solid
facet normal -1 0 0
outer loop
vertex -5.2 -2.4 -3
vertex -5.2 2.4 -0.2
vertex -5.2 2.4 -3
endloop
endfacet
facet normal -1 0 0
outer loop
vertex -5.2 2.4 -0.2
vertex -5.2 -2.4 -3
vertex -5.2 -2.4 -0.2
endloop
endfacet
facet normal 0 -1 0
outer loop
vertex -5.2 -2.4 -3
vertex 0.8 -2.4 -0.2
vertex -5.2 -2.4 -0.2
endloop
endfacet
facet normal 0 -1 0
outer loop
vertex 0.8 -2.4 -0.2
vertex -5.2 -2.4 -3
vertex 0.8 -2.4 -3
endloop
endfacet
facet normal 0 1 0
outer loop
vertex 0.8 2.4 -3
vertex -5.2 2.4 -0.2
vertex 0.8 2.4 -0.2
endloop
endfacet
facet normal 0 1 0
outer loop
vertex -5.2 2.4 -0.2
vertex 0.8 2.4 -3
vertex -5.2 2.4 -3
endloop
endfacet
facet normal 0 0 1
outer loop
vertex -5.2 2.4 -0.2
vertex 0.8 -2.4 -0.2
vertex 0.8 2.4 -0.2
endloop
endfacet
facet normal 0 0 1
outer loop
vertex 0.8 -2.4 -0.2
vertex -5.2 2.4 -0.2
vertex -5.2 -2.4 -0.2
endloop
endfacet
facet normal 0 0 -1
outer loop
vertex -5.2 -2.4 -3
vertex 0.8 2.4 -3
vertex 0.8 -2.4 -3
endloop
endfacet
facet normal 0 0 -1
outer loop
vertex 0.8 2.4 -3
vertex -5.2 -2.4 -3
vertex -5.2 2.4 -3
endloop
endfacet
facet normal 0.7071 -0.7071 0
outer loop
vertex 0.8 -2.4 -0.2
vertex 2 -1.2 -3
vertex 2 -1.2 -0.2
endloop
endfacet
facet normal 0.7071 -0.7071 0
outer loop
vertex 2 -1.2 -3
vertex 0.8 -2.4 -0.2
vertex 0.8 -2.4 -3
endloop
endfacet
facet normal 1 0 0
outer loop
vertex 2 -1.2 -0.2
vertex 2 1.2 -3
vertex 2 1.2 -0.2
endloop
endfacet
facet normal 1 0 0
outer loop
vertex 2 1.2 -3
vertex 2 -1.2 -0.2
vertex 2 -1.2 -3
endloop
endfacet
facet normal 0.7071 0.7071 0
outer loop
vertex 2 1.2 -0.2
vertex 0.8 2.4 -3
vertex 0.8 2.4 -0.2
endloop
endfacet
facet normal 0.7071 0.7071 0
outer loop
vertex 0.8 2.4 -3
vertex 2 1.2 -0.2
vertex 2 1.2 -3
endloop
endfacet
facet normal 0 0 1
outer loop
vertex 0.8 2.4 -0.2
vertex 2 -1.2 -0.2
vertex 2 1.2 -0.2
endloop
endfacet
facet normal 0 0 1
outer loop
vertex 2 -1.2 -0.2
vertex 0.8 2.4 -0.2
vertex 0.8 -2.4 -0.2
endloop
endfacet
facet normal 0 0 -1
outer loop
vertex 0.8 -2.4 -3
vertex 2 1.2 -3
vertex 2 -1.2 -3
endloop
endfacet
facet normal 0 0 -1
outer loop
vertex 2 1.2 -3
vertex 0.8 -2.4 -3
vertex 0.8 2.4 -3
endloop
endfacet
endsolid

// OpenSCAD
// file: ../p/rect3.scad
use <../lib.scad>
function ldraw_lib__rect3() = [
// 0 Rectangle with 3 Edges
// 0 Name: rect3.dat
// 0 Author: Mark Kennedy [mkennedy]
// 0 !LDRAW_ORG Primitive UPDATE 2010-01
// 0 !LICENSE Licensed under CC BY 4.0 : see CAreadme.txt
// 
// 0 BFC CERTIFY CCW
  [0,"BFC","CERTIFY"],
  [0,"BFC","CCW"],
// 
// 0 !HISTORY 2003-08-01 [PTadmin] Official Update 2003-02
// 0 !HISTORY 2007-06-24 [PTadmin] Header formatted for Contributor Agreement
// 0 !HISTORY 2008-07-01 [PTadmin] Official Update 2008-01
// 0 !HISTORY 2010-01-17 [mikeheide] Change winding to CCW
// 0 !HISTORY 2010-04-05 [PTadmin] Official Update 2010-01
// 
// 
// 2 24 1 0 1 -1 0 1
  [2,24,1,0,1,-1,0,1],
// 2 24 1 0 1 1 0 -1
  [2,24,1,0,1,1,0,-1],
// 2 24 -1 0 1 -1 0 -1
  [2,24,-1,0,1,-1,0,-1],
// 4 16 -1 0 1 -1 0 -1 1 0 -1 1 0 1
  [4,16,-1,0,1,-1,0,-1,1,0,-1,1,0,1],
// 0 //
];
module ldraw_lib__rect3(step=0, col=false, unit=2/5, alt=false, line=0.2, solid=!$preview)
    makepoly(ldraw_lib__rect3(), step=step, col=col, unit=unit, alt=alt, line=line, solid=solid);
ldraw_lib__rect3(line=0.2);
// file: ../p/rect2p.scad
use <../lib.scad>
function ldraw_lib__rect2p() = [
// 0 Rectangle with 2 Parallel Edges
// 0 Name: rect2p.dat
// 0 Author: Donald Sutter [technog]
// 0 !LDRAW_ORG Primitive UPDATE 2010-01
// 0 !LICENSE Licensed under CC BY 4.0 : see CAreadme.txt
// 
// 0 BFC CERTIFY CCW
  [0,"BFC","CERTIFY"],
  [0,"BFC","CCW"],
// 
// 0 !HISTORY 2003-08-01 [PTadmin] Official Update 2003-02
// 0 !HISTORY 2007-06-24 [PTadmin] Header formatted for Contributor Agreement
// 0 !HISTORY 2008-07-01 [PTadmin] Official Update 2008-01
// 0 !HISTORY 2010-01-17 [mikeheide] changed winding to CCW
// 0 !HISTORY 2010-04-05 [PTadmin] Official Update 2010-01
// 
// 
// 2 24 1 0 1 -1 0 1
  [2,24,1,0,1,-1,0,1],
// 2 24 -1 0 -1 1 0 -1
  [2,24,-1,0,-1,1,0,-1],
// 4 16 -1 0 1 -1 0 -1 1 0 -1 1 0 1
  [4,16,-1,0,1,-1,0,-1,1,0,-1,1,0,1],
// 0
];
module ldraw_lib__rect2p(step=0, col=false, unit=2/5, alt=false, line=0.2, solid=!$preview)
    makepoly(ldraw_lib__rect2p(), step=step, col=col, unit=unit, alt=alt, line=line, solid=solid);
ldraw_lib__rect2p(line=0.2);
// file: ../p/box5-2p.scad
use <../lib.scad>
function ldraw_lib__box5_2p() = [
// 0 Box with 5 Faces without 2 Parallel Edges
// 0 Name: box5-2p.dat
// 0 Author: Joerg Sommerer [Brickaneer]
// 0 !LDRAW_ORG Primitive UPDATE 2012-01
// 0 !LICENSE Licensed under CC BY 2.0 and CC BY 4.0 : see CAreadme.txt
// 
// 0 BFC CERTIFY CCW
  [0,"BFC","CERTIFY"],
  [0,"BFC","CCW"],
// 
// 0 !HISTORY 2012-03-30 [PTadmin] Official Update 2012-01
// 
// 
// 2 24 1 1 1 -1 1 1
  [2,24,1,1,1,-1,1,1],
// 2 24 -1 1 1 -1 1 -1
  [2,24,-1,1,1,-1,1,-1],
// 2 24 -1 1 -1 1 1 -1
  [2,24,-1,1,-1,1,1,-1],
// 2 24 1 1 -1 1 1 1
  [2,24,1,1,-1,1,1,1],
// 2 24 1 0 1 1 1 1
  [2,24,1,0,1,1,1,1],
// 2 24 -1 0 1 -1 1 1
  [2,24,-1,0,1,-1,1,1],
// 2 24 1 0 -1 1 1 -1
  [2,24,1,0,-1,1,1,-1],
// 2 24 -1 0 -1 -1 1 -1
  [2,24,-1,0,-1,-1,1,-1],
// 2 24 -1 0 1 -1 0 -1
  [2,24,-1,0,1,-1,0,-1],
// 2 24 1 0 -1 1 0 1
  [2,24,1,0,-1,1,0,1],
// 4 16 1 1 -1 -1 1 -1 -1 1 1 1 1 1
  [4,16,1,1,-1,-1,1,-1,-1,1,1,1,1,1],
// 4 16 -1 1 1 -1 0 1 1 0 1 1 1 1
  [4,16,-1,1,1,-1,0,1,1,0,1,1,1,1],
// 4 16 -1 1 -1 -1 0 -1 -1 0 1 -1 1 1
  [4,16,-1,1,-1,-1,0,-1,-1,0,1,-1,1,1],
// 4 16 1 1 -1 1 0 -1 -1 0 -1 -1 1 -1
  [4,16,1,1,-1,1,0,-1,-1,0,-1,-1,1,-1],
// 4 16 1 1 1 1 0 1 1 0 -1 1 1 -1
  [4,16,1,1,1,1,0,1,1,0,-1,1,1,-1],
];
module ldraw_lib__box5_2p(step=0, col=false, unit=2/5, alt=false, line=0.2, solid=!$preview)
    makepoly(ldraw_lib__box5_2p(), step=step, col=col, unit=unit, alt=alt, line=line, solid=solid);
ldraw_lib__box5_2p(line=0.2);
// main file
use <../lib.scad>
use <../p/box5-2p.scad>
use <../p/rect2p.scad>
use <../p/rect3.scad>
function ldraw_lib__t1054() = [
// 0 ~| Circuit Cubes Corner Shim
// 0 Name: t1054.dat
// 0 Author: Philippe Hurbain [Philo]
// 0 !LDRAW_ORG Part UPDATE 2022-05
// 0 !LICENSE Licensed under CC BY 4.0 : see CAreadme.txt
// 
// 0 BFC CERTIFY CCW
  [0,"BFC","CERTIFY"],
  [0,"BFC","CCW"],
// 
// 0 !CATEGORY Electric
// 
// 0 !HISTORY 2022-09-15 [PTadmin] Official Update 2022-05
// 
// 
// 1 16 2 4 0 0 -15 0 0 0 -3.5 6 0 0 box5-2p.dat
  [1,16,2,4,0,0,-15,0,0,0,-3.5,6,0,0, ldraw_lib__box5_2p()],
// 1 16 3.5 4 -4.5 0 -1 1.5 3.5 0 0 0 0 1.5 rect3.dat
  [1,16,3.5,4,-4.5,0,-1,1.5,3.5,0,0,0,0,1.5, ldraw_lib__rect3()],
// 1 16 5 4 0 0 -1 0 3.5 0 0 0 0 3 rect3.dat
  [1,16,5,4,0,0,-1,0,3.5,0,0,0,0,3, ldraw_lib__rect3()],
// 1 16 3.5 4 4.5 1.5 -1 0 0 0 3.5 -1.5 0 0 rect2p.dat
  [1,16,3.5,4,4.5,1.5,-1,0,0,0,3.5,-1.5,0,0, ldraw_lib__rect2p()],
// 4 16 2 0.5 6 2 0.5 -6 5 0.5 -3 5 0.5 3
  [4,16,2,0.5,6,2,0.5,-6,5,0.5,-3,5,0.5,3],
// 4 16 5 7.5 -3 2 7.5 -6 2 7.5 6 5 7.5 3
  [4,16,5,7.5,-3,2,7.5,-6,2,7.5,6,5,7.5,3],
];
module ldraw_lib__t1054(step=0, col=false, unit=2/5, alt=false, line=0.2, solid=!$preview)
    makepoly(ldraw_lib__t1054(), step=step, col=col, unit=unit, alt=alt, line=line, solid=solid);
ldraw_lib__t1054(line=0.2);
